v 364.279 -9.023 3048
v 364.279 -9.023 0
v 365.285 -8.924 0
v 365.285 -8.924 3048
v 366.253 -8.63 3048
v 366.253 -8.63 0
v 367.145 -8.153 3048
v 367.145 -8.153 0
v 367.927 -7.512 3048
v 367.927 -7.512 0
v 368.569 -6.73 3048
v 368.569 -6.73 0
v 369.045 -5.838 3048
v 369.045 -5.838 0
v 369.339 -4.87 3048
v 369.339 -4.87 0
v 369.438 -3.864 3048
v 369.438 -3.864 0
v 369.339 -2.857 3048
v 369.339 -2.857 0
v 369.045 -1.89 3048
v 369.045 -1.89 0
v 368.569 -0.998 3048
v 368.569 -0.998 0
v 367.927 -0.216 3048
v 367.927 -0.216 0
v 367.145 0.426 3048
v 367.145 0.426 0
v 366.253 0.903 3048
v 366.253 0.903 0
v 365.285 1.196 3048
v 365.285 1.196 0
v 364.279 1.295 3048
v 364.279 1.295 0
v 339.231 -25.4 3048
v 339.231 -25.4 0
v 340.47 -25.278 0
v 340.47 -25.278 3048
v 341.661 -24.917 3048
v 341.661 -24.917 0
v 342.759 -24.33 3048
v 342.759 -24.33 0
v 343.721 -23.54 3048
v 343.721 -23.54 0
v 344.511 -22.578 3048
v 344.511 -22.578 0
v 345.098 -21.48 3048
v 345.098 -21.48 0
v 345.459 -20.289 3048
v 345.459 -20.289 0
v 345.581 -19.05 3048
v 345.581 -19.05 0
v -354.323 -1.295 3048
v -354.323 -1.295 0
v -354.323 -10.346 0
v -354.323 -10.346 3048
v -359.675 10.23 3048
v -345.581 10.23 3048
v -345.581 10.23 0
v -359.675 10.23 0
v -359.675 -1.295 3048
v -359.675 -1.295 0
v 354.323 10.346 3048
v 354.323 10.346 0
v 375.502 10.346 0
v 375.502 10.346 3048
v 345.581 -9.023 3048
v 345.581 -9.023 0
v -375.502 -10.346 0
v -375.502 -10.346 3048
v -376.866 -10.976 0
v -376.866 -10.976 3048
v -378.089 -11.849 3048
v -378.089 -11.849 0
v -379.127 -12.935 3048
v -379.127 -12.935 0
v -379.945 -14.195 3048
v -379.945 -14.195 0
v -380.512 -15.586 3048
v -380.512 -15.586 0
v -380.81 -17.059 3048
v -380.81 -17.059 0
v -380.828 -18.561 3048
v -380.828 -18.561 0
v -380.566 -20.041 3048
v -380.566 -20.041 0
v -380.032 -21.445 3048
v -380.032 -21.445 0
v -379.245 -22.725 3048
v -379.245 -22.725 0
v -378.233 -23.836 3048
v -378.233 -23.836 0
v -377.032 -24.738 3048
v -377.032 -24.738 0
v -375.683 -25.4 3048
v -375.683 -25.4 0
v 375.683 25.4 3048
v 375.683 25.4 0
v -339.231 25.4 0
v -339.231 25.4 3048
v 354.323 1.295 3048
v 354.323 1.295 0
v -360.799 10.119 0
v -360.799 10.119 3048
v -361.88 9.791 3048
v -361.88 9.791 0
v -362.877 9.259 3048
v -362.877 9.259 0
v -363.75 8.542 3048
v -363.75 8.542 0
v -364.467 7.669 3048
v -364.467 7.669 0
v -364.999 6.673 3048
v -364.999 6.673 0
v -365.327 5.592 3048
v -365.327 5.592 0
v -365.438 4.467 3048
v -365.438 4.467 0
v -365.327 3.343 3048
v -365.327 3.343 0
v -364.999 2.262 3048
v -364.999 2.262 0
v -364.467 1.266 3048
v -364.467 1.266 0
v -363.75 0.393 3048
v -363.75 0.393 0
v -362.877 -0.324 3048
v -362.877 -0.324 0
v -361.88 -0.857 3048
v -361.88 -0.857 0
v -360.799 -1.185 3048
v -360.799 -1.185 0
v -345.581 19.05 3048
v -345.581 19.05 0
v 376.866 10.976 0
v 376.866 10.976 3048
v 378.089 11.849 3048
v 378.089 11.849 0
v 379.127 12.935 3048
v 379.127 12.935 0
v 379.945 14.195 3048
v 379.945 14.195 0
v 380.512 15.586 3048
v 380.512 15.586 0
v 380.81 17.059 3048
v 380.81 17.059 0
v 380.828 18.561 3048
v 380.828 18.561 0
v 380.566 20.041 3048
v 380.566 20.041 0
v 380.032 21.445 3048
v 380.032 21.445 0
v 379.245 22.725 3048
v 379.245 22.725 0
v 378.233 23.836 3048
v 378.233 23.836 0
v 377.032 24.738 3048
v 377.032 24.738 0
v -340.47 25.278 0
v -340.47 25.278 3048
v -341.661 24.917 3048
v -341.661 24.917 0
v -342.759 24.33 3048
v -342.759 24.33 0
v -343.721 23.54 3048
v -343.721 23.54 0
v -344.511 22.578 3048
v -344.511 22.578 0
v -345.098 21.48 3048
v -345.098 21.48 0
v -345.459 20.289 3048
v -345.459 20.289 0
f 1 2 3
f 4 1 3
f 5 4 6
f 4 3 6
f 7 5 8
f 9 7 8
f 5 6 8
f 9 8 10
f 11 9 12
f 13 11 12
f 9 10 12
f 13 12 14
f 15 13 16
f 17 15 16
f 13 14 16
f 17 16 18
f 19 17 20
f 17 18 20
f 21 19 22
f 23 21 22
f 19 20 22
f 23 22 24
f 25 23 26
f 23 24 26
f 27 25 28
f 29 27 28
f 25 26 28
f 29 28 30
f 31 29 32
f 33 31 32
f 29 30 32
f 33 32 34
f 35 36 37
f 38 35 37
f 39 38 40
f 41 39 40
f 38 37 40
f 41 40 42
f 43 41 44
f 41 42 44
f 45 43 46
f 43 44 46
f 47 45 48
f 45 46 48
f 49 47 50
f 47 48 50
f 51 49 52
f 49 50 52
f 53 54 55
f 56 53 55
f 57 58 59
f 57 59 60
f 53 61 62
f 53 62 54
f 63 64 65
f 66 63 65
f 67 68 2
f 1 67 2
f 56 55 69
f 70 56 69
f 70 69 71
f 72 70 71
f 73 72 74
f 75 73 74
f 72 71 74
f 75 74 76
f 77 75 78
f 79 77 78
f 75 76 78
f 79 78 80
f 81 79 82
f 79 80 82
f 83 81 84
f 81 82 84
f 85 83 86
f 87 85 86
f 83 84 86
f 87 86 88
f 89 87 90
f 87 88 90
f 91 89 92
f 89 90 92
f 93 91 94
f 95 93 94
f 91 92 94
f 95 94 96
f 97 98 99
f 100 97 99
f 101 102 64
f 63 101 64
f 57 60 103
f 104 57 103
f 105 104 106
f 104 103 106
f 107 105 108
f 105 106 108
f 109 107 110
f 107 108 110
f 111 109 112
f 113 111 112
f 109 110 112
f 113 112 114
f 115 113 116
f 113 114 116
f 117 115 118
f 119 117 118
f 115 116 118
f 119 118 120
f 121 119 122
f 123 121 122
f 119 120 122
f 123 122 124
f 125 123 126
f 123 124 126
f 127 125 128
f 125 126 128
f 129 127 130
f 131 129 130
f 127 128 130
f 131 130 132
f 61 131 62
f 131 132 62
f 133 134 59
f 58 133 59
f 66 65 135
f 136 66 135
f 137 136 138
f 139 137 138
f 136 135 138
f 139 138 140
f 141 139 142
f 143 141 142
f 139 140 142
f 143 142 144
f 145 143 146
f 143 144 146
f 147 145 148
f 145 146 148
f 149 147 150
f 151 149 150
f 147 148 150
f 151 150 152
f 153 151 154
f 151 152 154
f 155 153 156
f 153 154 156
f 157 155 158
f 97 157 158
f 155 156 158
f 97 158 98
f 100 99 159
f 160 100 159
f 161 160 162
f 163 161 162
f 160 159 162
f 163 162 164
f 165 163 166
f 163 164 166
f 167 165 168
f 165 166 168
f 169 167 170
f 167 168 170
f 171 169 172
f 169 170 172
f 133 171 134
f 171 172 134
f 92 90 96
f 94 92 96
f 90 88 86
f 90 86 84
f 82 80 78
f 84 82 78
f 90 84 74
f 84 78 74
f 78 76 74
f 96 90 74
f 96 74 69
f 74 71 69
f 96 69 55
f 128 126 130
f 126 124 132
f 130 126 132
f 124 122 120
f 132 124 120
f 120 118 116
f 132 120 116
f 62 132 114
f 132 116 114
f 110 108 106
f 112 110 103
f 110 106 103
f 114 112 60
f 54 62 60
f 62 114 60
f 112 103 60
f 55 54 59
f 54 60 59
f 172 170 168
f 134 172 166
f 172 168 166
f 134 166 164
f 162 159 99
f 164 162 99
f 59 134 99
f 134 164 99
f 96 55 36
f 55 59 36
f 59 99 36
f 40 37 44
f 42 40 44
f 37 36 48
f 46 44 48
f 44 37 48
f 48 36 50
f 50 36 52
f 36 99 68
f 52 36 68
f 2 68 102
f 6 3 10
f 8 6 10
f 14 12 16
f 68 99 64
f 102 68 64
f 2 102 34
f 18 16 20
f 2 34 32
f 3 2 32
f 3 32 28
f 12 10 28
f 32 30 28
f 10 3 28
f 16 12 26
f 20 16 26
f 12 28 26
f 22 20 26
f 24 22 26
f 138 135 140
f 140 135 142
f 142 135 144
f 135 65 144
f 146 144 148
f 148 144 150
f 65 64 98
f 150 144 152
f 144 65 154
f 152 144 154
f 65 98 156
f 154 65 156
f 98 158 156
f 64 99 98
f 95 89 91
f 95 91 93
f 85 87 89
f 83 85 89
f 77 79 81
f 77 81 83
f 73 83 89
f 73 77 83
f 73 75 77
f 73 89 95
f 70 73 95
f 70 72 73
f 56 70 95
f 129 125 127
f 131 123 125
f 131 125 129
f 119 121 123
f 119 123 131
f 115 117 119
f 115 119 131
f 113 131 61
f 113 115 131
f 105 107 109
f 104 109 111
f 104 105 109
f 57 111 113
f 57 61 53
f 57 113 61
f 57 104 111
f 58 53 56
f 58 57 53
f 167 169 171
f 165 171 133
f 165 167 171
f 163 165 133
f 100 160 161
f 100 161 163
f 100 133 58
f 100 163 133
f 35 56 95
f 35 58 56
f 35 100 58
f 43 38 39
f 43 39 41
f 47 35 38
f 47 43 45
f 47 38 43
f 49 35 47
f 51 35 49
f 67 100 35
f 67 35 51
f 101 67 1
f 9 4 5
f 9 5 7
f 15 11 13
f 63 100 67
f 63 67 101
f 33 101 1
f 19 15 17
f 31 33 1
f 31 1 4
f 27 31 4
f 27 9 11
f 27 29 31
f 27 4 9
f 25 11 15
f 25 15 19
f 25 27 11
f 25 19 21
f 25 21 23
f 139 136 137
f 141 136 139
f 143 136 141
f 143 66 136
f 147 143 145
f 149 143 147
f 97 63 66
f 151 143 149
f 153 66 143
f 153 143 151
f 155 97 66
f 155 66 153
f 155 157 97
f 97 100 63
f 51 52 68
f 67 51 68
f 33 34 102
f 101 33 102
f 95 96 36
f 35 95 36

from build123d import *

# Parameters (mm, degrees)
F1_DEPTH = 3048


with BuildPart() as f1:
    # F0 (on Top) → F1 (new body)
    with BuildSketch(Plane.XY):
        with BuildLine():
            Line((375.683069, 25.4), (-339.230995, 25.4))
            ThreePointArc((-339.230995, 25.4), (-343.721123, 23.540128), (-345.580995, 19.05))
            Line((-345.580995, 19.05), (-345.580995, 10.229934))
            Line((-345.580995, 10.229934), (-359.675169, 10.229934))
            ThreePointArc((-359.675169, 10.229934), (-365.437749, 4.467354), (-359.675169, -1.295227))
            Line((-359.675169, -1.295227), (-354.32294, -1.295227))
            Line((-354.32294, -1.295227), (-354.32294, -10.346132))
            Line((-354.32294, -10.346132), (-375.50205, -10.346132))
            ThreePointArc((-375.50205, -10.346132), (-380.854683, -17.80979), (-375.683069, -25.4))
            Line((-375.683069, -25.4), (339.230995, -25.4))
            ThreePointArc((339.230995, -25.4), (343.721123, -23.540128), (345.580995, -19.05))
            Line((345.580995, -19.05), (345.580995, -9.022805))
            Line((345.580995, -9.022805), (364.278942, -9.022805))
            ThreePointArc((364.278942, -9.022805), (369.437958, -3.863789), (364.278942, 1.295227))
            Line((364.278942, 1.295227), (354.32294, 1.295227))
            Line((354.32294, 1.295227), (354.32294, 10.346132))
            Line((354.32294, 10.346132), (375.50205, 10.346132))
            ThreePointArc((375.50205, 10.346132), (380.854683, 17.80979), (375.683069, 25.4))
        make_face()
    extrude(amount=F1_DEPTH)


solid = f1.part
